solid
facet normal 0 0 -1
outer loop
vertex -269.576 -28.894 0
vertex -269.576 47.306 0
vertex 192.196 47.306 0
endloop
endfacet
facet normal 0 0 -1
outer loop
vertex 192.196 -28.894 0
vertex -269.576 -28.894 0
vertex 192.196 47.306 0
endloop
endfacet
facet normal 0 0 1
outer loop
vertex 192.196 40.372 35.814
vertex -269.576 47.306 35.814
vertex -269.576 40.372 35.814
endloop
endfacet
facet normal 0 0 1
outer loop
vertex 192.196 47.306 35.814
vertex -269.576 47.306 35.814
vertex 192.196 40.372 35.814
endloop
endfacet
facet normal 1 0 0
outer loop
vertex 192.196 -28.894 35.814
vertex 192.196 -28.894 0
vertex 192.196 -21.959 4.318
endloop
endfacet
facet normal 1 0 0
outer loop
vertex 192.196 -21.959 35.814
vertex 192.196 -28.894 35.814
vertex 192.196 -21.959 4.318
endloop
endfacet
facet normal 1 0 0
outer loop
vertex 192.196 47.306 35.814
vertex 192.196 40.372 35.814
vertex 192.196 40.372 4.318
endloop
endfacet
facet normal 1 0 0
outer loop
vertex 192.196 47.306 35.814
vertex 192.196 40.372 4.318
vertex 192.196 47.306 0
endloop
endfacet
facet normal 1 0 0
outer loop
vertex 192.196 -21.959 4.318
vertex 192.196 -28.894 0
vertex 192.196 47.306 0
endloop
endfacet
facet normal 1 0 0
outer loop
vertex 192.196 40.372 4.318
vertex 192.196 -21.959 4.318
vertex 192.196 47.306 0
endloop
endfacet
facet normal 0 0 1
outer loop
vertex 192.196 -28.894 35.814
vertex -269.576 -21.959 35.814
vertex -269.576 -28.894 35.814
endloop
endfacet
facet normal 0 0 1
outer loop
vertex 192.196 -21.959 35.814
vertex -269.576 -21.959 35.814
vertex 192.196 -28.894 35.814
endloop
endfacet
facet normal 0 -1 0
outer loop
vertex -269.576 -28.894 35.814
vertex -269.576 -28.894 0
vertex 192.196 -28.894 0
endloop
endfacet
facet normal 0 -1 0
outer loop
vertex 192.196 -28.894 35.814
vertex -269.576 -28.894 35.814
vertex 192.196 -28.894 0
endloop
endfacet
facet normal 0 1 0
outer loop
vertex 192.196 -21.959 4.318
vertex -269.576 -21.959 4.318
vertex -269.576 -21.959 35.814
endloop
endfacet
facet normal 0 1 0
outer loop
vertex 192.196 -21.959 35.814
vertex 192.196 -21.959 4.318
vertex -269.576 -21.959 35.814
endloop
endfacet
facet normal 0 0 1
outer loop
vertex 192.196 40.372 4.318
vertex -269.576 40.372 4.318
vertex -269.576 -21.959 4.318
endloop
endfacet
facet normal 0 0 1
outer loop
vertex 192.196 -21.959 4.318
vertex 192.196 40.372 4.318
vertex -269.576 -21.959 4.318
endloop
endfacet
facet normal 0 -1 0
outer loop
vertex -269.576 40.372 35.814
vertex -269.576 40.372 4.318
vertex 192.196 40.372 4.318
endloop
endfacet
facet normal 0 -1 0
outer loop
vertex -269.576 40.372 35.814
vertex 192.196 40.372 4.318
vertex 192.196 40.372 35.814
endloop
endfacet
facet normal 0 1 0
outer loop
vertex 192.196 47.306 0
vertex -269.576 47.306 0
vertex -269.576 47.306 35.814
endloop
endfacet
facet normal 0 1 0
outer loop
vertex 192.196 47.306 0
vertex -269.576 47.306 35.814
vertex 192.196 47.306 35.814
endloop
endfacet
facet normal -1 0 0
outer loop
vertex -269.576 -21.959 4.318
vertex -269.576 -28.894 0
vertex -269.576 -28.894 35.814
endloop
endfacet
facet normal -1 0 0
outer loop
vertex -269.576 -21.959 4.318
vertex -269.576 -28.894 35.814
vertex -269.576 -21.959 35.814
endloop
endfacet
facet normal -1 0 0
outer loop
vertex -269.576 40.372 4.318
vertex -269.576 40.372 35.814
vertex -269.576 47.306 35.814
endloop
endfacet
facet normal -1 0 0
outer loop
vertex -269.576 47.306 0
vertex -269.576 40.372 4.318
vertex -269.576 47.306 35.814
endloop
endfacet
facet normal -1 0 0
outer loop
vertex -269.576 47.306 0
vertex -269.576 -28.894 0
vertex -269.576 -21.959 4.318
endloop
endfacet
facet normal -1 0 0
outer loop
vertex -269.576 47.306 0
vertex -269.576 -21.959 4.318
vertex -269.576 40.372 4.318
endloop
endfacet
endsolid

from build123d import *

# Parameters (mm, degrees)
F0_W     = 461.772
F0_H     = 76.2
F1_DEPTH = 35.814
F2_W     = 62.3316
F2_H     = 31.496
F3_DEPTH = 461.773


with BuildPart() as f1:
    # F0 (on Top) → F1 (new body)
    with BuildSketch(Plane.XY):
        with Locations((-38.690397, 9.206371)):
            Rectangle(F0_W, F0_H)
    extrude(amount=F1_DEPTH)

    # F2 (on face) → F3 (cut, through all)
    with BuildSketch(Plane(origin=(-269.576397, 0, 0), x_dir=(0, -1, 0), z_dir=(-1, 0, 0))):
        with Locations((-9.206371, 20.066)):
            Rectangle(F2_W, F2_H)
    extrude(amount=-F3_DEPTH, mode=Mode.SUBTRACT)


solid = f1.part
